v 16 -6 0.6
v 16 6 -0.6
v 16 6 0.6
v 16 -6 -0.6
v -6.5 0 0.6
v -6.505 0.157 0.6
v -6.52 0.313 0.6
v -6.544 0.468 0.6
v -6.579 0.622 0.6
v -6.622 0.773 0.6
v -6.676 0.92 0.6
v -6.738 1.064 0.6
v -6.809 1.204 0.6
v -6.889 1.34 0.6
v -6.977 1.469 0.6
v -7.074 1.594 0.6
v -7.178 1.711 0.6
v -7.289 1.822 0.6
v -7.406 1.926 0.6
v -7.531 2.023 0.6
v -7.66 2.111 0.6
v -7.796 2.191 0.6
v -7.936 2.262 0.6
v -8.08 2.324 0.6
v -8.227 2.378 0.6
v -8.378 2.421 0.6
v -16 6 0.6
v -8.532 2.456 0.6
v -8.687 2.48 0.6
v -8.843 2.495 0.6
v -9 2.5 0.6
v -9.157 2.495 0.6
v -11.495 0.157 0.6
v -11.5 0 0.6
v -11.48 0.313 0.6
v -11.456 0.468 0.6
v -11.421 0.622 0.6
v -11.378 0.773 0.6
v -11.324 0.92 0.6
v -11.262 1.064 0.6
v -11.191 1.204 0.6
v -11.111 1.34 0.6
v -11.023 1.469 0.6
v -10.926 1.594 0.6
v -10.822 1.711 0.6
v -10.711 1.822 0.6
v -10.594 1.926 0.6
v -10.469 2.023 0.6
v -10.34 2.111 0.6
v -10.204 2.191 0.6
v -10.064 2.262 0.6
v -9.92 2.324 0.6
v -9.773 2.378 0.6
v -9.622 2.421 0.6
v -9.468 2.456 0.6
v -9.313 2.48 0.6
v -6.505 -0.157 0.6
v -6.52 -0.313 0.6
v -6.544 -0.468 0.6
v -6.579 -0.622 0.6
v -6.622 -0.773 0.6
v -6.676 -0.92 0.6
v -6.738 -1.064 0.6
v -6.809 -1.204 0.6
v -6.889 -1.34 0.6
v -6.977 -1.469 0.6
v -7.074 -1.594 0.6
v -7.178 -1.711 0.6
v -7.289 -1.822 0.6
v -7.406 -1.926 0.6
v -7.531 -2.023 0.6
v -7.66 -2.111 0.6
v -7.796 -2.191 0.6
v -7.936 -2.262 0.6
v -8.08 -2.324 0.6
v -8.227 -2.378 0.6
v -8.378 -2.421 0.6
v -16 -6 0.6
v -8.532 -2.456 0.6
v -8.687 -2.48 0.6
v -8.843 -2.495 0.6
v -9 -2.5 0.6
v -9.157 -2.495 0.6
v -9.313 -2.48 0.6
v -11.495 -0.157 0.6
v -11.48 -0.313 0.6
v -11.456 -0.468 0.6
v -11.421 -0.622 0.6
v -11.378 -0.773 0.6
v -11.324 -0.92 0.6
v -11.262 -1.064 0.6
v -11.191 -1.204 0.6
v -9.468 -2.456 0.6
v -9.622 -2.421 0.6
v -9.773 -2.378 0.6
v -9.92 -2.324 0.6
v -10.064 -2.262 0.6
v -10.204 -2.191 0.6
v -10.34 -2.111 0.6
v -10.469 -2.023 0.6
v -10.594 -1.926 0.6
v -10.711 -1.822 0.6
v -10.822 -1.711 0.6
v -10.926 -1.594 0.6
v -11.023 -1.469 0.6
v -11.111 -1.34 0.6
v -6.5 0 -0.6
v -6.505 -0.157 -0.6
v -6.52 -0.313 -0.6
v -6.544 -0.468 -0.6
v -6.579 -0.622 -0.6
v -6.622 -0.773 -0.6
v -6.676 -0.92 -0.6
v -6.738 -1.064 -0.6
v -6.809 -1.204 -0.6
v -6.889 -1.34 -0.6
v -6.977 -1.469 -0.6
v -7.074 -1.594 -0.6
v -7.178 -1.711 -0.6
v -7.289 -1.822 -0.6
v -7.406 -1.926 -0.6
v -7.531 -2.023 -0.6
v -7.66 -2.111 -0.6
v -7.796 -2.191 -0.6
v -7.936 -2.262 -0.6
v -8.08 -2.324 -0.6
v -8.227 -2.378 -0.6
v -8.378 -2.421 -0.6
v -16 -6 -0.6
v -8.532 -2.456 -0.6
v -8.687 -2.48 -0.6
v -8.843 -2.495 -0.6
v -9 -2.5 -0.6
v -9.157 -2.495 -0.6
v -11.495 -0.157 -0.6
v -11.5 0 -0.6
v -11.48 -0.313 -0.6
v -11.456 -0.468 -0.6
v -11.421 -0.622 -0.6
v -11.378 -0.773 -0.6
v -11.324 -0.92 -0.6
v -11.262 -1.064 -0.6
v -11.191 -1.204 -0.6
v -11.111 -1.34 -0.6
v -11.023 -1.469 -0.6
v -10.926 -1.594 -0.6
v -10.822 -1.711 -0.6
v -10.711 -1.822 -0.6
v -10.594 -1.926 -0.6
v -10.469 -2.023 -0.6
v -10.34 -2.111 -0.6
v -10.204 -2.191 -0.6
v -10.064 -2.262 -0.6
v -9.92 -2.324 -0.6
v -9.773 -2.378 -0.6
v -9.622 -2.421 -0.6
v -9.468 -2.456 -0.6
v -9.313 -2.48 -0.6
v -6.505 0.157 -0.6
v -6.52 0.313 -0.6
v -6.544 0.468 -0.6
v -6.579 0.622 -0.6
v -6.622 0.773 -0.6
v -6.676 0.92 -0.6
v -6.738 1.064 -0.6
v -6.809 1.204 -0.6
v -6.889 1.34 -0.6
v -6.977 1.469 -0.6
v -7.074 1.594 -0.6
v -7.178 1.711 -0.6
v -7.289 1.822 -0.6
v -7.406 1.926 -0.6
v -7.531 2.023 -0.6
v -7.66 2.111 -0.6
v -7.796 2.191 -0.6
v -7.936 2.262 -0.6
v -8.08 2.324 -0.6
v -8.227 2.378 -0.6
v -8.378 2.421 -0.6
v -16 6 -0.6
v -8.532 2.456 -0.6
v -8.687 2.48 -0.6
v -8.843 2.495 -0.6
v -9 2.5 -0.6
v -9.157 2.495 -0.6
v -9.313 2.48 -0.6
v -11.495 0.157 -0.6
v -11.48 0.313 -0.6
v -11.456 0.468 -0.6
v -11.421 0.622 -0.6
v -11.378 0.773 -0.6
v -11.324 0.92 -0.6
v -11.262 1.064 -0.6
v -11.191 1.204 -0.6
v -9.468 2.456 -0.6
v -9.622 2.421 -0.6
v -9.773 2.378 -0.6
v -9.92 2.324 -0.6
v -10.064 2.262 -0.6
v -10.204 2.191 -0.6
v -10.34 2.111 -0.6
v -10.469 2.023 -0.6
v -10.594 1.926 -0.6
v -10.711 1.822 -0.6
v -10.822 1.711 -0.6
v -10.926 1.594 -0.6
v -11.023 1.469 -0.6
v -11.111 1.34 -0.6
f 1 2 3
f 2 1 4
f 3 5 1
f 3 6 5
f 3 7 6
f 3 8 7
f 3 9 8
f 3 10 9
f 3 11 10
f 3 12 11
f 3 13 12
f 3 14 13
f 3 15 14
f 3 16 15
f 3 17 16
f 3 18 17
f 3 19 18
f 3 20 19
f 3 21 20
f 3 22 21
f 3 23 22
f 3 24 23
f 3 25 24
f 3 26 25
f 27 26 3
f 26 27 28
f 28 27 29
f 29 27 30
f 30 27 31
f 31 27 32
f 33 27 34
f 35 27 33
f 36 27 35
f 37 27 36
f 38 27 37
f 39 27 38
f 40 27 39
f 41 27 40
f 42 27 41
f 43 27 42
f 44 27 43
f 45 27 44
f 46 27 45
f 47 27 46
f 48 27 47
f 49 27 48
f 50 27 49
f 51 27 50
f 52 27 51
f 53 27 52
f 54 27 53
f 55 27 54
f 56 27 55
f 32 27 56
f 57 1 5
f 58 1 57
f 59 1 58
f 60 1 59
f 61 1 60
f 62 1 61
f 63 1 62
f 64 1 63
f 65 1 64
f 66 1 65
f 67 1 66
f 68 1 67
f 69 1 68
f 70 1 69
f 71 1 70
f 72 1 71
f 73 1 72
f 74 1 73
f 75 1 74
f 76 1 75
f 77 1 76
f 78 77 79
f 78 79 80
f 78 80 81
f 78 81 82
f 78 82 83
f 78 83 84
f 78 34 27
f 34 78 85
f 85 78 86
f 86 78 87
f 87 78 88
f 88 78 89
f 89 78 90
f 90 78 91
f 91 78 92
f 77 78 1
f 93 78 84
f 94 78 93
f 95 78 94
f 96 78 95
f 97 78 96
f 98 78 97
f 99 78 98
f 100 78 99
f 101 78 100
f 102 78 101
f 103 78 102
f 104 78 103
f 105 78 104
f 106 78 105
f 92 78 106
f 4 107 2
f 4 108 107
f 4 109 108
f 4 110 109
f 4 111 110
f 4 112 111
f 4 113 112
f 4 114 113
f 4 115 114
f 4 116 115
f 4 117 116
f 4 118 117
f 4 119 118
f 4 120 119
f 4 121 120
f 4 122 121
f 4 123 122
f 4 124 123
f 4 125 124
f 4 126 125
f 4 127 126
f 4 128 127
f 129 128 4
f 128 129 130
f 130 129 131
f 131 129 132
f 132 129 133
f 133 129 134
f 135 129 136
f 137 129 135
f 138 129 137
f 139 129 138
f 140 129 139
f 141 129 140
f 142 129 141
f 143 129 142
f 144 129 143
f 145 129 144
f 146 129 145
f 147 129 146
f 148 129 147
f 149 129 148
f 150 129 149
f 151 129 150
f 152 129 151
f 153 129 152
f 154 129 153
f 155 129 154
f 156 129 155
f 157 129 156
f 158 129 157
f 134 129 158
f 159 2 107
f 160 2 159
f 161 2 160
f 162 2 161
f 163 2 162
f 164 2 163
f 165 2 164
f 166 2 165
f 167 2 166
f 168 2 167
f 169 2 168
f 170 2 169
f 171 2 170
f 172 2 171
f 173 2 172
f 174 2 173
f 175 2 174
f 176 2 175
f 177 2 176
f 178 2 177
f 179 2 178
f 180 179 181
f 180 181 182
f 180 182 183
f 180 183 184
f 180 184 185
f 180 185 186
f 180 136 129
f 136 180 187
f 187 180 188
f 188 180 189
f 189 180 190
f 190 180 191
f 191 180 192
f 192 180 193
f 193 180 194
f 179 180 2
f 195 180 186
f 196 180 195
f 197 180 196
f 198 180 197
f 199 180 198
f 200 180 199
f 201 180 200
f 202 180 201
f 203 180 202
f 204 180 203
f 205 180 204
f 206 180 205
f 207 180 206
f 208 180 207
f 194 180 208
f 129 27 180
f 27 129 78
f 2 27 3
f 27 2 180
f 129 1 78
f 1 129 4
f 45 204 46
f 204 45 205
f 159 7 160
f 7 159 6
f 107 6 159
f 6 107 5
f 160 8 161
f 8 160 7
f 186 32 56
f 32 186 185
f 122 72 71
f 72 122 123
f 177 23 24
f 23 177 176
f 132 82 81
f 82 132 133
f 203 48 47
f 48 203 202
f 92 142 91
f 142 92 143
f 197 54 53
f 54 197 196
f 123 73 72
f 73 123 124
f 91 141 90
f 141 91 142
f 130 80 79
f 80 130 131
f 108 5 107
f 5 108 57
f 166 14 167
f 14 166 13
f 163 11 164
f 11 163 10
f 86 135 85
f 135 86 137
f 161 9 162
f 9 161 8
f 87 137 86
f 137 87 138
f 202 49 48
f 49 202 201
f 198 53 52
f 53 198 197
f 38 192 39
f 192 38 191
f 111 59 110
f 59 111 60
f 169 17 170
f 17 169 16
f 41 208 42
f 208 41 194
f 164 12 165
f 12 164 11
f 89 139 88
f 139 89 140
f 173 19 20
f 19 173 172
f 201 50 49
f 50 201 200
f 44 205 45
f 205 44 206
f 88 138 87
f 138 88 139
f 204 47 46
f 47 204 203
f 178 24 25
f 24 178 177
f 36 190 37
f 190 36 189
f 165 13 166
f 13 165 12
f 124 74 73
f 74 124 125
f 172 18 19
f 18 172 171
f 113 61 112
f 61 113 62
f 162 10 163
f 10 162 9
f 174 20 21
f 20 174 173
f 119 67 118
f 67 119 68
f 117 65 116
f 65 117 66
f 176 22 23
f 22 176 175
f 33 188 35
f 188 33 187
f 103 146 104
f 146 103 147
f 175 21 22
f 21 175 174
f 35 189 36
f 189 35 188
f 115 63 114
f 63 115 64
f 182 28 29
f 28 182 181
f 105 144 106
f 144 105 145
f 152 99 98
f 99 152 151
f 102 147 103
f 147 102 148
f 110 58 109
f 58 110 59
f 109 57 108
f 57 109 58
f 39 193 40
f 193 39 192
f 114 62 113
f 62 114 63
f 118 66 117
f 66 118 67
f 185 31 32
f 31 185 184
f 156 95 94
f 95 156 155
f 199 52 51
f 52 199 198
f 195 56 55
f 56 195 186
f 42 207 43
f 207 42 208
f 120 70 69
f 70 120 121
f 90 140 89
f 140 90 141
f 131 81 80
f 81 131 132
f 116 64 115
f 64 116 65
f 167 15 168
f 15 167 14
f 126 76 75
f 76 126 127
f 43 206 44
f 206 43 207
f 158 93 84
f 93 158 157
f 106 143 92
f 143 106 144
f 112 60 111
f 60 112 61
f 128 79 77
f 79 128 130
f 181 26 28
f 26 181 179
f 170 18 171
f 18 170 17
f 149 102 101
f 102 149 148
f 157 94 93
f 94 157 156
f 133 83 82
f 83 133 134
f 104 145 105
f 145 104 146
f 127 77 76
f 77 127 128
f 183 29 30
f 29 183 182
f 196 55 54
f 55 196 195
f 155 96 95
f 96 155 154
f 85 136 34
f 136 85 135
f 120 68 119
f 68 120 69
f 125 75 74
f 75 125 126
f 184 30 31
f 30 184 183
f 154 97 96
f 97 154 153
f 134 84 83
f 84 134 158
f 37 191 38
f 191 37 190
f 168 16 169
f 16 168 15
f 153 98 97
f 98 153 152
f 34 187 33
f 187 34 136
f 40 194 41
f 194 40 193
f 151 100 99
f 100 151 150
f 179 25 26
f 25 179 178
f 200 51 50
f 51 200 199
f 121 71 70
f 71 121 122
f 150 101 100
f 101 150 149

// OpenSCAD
// Base rectangle dimensions
length = 32;   // mm
width  = 12;   // mm
height = 1.2;  // mm

// Hole dimensions
hole_diameter = 5;  // mm

// Added rectangle dimensions
rect2_length = 4.7625;  // mm
rect2_width  = 12;      // mm
rect2_height = 12;      // mm

// Toggle: set to true to show the second rectangle, false to hide it
show_second_rect = false;

// Smoothness
$fn = 100;

// Main model
difference() {
    union() {
        // Base rectangle
        cube([length, width, height], center = true);
        
        // Optional second rectangle
        if (show_second_rect) {
            translate([(length/2) - (rect2_length/2), 0, (rect2_height/2) - (height/2)])
                cube([rect2_length, rect2_width, rect2_height], center = true);
        }
    }
    
    // Cylindrical hole moved 7 mm along X-axis
    translate([-9, 0, 0])
        cylinder(d = hole_diameter, h = rect2_height + height, center = true);
}
